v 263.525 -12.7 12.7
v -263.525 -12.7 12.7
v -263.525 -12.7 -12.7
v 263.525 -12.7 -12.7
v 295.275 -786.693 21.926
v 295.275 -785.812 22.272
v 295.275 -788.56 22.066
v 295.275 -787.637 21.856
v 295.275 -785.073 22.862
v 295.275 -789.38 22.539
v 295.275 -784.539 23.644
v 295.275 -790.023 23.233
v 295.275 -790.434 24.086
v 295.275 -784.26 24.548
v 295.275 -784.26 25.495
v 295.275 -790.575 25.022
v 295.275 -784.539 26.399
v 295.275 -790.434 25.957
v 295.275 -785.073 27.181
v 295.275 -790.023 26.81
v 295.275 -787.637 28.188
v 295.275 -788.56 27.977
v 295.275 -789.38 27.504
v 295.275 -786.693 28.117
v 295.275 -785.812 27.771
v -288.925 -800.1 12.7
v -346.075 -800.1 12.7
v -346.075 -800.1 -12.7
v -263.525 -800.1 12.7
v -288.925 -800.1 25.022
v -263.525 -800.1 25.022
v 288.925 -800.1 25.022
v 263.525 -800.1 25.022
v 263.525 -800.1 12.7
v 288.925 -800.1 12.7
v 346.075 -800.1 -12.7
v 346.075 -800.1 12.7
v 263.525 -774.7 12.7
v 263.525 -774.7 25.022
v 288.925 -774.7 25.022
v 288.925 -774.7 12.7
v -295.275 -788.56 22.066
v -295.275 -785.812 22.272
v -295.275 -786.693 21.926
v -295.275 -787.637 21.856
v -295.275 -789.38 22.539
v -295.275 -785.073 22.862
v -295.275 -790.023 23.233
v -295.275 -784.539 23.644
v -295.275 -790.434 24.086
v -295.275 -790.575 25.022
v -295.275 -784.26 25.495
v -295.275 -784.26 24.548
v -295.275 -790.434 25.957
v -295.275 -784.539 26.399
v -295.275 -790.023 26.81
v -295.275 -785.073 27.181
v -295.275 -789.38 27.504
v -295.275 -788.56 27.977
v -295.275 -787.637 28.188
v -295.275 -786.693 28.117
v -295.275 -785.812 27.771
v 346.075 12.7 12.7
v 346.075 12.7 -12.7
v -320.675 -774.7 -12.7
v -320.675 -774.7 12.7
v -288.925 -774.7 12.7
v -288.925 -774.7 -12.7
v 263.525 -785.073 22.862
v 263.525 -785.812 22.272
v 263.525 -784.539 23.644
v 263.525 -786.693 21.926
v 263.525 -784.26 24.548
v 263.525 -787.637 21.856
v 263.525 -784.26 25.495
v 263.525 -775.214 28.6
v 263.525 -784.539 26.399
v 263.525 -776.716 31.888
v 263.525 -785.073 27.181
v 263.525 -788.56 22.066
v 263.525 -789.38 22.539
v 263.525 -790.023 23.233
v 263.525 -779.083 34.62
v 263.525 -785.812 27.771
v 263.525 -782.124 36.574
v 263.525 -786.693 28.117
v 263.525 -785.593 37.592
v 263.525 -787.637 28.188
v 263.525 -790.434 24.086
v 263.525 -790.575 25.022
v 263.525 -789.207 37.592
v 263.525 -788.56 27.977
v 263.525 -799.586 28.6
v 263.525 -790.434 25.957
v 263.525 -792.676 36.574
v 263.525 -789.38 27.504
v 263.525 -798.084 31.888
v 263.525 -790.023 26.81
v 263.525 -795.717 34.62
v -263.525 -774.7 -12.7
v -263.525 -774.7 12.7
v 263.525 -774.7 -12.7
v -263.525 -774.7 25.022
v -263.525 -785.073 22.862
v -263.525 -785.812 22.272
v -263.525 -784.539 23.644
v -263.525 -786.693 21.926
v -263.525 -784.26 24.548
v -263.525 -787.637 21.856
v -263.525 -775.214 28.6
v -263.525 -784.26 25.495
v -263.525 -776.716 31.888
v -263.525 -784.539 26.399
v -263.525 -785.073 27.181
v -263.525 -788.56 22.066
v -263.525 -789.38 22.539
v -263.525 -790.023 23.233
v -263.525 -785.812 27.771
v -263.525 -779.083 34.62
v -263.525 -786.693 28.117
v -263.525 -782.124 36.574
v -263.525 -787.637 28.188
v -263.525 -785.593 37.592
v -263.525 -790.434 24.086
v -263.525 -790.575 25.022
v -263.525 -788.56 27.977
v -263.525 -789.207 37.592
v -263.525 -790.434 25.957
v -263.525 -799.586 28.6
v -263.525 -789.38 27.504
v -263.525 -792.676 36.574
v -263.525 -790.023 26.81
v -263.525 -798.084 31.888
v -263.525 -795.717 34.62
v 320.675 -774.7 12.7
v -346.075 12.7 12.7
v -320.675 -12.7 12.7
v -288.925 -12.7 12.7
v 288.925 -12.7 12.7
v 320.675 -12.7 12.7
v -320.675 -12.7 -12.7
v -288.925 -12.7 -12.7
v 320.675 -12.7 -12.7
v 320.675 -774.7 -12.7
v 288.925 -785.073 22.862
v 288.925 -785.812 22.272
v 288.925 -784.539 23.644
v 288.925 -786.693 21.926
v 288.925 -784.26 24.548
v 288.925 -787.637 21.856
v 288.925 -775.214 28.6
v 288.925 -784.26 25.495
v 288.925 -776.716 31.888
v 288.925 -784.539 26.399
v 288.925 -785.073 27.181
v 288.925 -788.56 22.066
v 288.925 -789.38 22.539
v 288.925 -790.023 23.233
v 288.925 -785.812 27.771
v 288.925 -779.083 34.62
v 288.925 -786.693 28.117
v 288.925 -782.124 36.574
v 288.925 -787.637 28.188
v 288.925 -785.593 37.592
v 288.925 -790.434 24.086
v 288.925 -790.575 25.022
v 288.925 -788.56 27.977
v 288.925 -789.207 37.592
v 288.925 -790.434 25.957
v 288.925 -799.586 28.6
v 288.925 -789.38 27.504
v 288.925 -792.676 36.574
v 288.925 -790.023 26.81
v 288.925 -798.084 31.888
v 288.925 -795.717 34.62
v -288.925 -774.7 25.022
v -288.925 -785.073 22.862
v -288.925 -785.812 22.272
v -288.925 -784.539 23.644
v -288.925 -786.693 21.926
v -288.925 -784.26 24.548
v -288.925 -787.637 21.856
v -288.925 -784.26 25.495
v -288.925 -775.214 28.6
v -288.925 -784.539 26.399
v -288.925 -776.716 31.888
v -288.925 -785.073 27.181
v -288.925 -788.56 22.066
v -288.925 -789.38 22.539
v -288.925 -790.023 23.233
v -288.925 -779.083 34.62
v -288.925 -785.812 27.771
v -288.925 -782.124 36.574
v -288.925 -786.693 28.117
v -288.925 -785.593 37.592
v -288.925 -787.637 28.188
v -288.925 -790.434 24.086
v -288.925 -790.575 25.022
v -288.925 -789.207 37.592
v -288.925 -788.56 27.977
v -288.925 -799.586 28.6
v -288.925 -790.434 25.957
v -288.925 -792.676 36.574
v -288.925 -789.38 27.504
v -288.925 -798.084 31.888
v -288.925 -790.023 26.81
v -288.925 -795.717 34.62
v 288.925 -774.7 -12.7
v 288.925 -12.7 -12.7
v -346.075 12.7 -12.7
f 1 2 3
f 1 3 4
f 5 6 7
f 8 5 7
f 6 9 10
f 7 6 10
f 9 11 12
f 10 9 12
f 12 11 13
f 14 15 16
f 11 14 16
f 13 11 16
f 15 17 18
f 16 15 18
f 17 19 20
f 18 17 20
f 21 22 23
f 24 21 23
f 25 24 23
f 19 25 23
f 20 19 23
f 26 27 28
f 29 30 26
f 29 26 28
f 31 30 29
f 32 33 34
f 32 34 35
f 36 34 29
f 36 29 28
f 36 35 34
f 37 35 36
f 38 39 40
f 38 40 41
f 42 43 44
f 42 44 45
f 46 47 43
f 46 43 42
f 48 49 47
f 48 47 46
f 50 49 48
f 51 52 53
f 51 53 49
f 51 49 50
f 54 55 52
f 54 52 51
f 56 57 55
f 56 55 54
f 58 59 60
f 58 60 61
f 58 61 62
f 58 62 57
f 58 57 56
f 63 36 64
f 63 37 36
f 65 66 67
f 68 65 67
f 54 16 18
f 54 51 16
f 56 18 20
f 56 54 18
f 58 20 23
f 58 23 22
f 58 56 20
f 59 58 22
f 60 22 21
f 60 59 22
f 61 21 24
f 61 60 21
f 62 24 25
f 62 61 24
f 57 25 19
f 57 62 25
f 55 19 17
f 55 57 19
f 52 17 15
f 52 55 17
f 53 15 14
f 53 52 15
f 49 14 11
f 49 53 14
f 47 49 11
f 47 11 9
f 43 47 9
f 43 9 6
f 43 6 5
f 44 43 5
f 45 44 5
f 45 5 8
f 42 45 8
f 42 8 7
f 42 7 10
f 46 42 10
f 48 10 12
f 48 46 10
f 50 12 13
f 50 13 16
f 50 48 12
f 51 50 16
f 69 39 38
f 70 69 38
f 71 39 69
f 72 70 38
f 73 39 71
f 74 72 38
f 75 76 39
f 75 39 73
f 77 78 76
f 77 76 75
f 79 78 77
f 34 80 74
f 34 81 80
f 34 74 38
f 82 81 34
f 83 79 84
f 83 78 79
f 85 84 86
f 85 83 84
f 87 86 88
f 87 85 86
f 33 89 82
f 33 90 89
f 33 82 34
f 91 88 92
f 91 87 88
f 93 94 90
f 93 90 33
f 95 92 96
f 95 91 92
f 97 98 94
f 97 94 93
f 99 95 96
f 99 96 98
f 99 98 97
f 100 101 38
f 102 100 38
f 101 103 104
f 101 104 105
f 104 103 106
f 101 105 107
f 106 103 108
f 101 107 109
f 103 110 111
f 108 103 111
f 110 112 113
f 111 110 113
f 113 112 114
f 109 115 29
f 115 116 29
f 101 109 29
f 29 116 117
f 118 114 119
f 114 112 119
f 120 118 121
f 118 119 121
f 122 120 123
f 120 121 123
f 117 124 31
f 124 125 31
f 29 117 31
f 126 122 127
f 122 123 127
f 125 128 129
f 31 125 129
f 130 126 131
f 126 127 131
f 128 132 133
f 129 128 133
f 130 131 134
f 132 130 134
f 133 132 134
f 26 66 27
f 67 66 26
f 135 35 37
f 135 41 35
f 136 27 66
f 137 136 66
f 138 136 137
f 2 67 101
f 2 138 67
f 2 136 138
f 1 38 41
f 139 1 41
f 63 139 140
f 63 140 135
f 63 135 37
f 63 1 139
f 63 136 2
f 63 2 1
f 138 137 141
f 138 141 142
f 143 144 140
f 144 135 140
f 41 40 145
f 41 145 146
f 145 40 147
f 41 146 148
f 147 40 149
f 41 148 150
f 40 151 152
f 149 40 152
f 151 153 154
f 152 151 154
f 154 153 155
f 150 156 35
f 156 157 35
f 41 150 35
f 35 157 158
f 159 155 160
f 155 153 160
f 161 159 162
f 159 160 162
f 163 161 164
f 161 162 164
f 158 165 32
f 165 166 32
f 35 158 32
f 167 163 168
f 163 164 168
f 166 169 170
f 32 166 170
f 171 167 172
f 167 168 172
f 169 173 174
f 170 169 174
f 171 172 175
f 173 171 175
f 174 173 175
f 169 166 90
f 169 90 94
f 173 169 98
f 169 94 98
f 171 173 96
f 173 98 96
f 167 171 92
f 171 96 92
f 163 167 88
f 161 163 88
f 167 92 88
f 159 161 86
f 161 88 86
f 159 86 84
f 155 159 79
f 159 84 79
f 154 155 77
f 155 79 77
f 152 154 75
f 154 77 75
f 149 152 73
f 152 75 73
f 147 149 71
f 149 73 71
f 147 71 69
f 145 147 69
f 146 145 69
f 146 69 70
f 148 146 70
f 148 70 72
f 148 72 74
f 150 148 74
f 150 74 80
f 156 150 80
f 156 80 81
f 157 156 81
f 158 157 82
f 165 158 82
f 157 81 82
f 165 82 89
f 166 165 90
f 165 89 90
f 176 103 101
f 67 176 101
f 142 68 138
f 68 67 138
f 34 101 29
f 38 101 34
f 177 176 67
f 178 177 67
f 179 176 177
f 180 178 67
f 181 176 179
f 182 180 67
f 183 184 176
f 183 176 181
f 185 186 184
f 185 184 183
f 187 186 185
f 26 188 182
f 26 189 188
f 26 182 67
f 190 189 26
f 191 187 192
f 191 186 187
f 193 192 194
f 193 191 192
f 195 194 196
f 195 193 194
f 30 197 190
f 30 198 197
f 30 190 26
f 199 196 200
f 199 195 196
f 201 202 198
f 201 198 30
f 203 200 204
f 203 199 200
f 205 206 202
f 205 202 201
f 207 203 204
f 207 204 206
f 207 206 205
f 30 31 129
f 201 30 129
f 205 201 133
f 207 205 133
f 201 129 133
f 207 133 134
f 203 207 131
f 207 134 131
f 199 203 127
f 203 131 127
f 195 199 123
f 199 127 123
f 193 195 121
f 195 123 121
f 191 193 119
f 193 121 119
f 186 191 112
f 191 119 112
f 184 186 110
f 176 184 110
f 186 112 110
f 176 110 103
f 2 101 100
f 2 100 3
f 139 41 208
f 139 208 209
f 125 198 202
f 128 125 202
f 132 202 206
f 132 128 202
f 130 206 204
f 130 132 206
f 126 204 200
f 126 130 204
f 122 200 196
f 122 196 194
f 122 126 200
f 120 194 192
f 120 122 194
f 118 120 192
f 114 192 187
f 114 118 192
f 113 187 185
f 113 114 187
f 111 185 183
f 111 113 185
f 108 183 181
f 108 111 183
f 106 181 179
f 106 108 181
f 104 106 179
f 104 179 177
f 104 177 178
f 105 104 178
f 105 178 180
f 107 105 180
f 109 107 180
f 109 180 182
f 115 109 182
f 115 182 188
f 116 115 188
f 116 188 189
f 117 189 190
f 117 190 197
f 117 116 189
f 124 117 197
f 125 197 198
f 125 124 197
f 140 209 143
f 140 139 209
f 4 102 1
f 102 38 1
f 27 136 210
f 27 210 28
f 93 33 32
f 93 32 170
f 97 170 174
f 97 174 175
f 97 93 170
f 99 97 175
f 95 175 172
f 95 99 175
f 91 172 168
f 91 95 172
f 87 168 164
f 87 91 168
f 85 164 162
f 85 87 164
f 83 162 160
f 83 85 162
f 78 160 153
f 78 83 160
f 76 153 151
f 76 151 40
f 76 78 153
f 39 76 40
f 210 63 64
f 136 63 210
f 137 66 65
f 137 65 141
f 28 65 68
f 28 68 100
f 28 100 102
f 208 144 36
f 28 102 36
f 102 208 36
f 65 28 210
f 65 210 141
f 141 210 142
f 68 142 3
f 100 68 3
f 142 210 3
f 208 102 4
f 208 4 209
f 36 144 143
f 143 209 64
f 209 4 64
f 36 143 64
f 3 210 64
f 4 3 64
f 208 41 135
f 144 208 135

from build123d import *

# Parameters (mm, degrees)
F0_W     = 31.75
F0_H     = 762
F0_W_2   = 527.05
F1_DEPTH = 12.7
F2_R     = 3.175
F3_DEPTH = 25.4
F4_DEPTH = 558.8
F5_DEPTH = 31.75


# Not quite as in the source:
# - a pattern or mirror of a feature is missing from the dataset's text; its kind, count and spacing are read off the source's solid


with BuildPart() as f1:
    # F0 (on Top) → F1 (new body, symmetric)
    with BuildSketch(Plane.XY):
        Polygon((346.075, -12.7), (346.075, 12.7), (-346.075, 12.7), (-346.075, -800.1), (346.075, -800.1), align=None)
        with Locations((-304.8, -393.7)):
            Rectangle(F0_W, F0_H, mode=Mode.SUBTRACT)
        with Locations((0, -393.7)):
            Rectangle(F0_W_2, F0_H, mode=Mode.SUBTRACT)
        with Locations((304.8, -393.7)):
            Rectangle(F0_W, F0_H, mode=Mode.SUBTRACT)
    extrude(amount=F1_DEPTH, both=True)

    # F2 (on face) → F3 (join)
    with BuildSketch(Plane(origin=(263.525, 0, 0), x_dir=(0, -1, 0), z_dir=(-1, 0, 0))):
        with BuildLine():
            Line((800.1, -12.7), (800.1, 12.7))
            Line((800.1, 12.7), (800.1, 25.0216443092))
            ThreePointArc((800.1, 25.0216443092), (787.4, 37.7216443092), (774.7, 25.0216443092))
            Line((774.7, 25.0216443092), (774.7, 12.7))
            Line((774.7, 12.7), (774.7, -12.7))
            Line((774.7, -12.7), (800.1, -12.7))
        make_face()
        with Locations((787.4, 25.0216443092)):
            Circle(F2_R, mode=Mode.SUBTRACT)
    f3 = extrude(amount=-F3_DEPTH)

    # F3_copies: F3 across plane
    add(f3.mirror(Plane(origin=(0, 0, 0), x_dir=(0, 0, -1), z_dir=(-1, 0, 0))))


with BuildPart() as f4:
    # F2 (on face) → F4 (new body)
    with BuildSketch(Plane(origin=(263.525, 0, 0), x_dir=(0, -1, 0), z_dir=(-1, 0, 0))):
        with Locations((787.4, 25.0216443092)):
            Circle(F2_R)
    extrude(amount=F4_DEPTH)

    # F2 (on face) → F5 (join)
    with BuildSketch(Plane(origin=(263.525, 0, 0), x_dir=(0, -1, 0), z_dir=(-1, 0, 0))):
        with Locations((787.4, 25.0216443092)):
            Circle(F2_R)
    extrude(amount=-F5_DEPTH)


solid = Compound([f1.part, f4.part])
